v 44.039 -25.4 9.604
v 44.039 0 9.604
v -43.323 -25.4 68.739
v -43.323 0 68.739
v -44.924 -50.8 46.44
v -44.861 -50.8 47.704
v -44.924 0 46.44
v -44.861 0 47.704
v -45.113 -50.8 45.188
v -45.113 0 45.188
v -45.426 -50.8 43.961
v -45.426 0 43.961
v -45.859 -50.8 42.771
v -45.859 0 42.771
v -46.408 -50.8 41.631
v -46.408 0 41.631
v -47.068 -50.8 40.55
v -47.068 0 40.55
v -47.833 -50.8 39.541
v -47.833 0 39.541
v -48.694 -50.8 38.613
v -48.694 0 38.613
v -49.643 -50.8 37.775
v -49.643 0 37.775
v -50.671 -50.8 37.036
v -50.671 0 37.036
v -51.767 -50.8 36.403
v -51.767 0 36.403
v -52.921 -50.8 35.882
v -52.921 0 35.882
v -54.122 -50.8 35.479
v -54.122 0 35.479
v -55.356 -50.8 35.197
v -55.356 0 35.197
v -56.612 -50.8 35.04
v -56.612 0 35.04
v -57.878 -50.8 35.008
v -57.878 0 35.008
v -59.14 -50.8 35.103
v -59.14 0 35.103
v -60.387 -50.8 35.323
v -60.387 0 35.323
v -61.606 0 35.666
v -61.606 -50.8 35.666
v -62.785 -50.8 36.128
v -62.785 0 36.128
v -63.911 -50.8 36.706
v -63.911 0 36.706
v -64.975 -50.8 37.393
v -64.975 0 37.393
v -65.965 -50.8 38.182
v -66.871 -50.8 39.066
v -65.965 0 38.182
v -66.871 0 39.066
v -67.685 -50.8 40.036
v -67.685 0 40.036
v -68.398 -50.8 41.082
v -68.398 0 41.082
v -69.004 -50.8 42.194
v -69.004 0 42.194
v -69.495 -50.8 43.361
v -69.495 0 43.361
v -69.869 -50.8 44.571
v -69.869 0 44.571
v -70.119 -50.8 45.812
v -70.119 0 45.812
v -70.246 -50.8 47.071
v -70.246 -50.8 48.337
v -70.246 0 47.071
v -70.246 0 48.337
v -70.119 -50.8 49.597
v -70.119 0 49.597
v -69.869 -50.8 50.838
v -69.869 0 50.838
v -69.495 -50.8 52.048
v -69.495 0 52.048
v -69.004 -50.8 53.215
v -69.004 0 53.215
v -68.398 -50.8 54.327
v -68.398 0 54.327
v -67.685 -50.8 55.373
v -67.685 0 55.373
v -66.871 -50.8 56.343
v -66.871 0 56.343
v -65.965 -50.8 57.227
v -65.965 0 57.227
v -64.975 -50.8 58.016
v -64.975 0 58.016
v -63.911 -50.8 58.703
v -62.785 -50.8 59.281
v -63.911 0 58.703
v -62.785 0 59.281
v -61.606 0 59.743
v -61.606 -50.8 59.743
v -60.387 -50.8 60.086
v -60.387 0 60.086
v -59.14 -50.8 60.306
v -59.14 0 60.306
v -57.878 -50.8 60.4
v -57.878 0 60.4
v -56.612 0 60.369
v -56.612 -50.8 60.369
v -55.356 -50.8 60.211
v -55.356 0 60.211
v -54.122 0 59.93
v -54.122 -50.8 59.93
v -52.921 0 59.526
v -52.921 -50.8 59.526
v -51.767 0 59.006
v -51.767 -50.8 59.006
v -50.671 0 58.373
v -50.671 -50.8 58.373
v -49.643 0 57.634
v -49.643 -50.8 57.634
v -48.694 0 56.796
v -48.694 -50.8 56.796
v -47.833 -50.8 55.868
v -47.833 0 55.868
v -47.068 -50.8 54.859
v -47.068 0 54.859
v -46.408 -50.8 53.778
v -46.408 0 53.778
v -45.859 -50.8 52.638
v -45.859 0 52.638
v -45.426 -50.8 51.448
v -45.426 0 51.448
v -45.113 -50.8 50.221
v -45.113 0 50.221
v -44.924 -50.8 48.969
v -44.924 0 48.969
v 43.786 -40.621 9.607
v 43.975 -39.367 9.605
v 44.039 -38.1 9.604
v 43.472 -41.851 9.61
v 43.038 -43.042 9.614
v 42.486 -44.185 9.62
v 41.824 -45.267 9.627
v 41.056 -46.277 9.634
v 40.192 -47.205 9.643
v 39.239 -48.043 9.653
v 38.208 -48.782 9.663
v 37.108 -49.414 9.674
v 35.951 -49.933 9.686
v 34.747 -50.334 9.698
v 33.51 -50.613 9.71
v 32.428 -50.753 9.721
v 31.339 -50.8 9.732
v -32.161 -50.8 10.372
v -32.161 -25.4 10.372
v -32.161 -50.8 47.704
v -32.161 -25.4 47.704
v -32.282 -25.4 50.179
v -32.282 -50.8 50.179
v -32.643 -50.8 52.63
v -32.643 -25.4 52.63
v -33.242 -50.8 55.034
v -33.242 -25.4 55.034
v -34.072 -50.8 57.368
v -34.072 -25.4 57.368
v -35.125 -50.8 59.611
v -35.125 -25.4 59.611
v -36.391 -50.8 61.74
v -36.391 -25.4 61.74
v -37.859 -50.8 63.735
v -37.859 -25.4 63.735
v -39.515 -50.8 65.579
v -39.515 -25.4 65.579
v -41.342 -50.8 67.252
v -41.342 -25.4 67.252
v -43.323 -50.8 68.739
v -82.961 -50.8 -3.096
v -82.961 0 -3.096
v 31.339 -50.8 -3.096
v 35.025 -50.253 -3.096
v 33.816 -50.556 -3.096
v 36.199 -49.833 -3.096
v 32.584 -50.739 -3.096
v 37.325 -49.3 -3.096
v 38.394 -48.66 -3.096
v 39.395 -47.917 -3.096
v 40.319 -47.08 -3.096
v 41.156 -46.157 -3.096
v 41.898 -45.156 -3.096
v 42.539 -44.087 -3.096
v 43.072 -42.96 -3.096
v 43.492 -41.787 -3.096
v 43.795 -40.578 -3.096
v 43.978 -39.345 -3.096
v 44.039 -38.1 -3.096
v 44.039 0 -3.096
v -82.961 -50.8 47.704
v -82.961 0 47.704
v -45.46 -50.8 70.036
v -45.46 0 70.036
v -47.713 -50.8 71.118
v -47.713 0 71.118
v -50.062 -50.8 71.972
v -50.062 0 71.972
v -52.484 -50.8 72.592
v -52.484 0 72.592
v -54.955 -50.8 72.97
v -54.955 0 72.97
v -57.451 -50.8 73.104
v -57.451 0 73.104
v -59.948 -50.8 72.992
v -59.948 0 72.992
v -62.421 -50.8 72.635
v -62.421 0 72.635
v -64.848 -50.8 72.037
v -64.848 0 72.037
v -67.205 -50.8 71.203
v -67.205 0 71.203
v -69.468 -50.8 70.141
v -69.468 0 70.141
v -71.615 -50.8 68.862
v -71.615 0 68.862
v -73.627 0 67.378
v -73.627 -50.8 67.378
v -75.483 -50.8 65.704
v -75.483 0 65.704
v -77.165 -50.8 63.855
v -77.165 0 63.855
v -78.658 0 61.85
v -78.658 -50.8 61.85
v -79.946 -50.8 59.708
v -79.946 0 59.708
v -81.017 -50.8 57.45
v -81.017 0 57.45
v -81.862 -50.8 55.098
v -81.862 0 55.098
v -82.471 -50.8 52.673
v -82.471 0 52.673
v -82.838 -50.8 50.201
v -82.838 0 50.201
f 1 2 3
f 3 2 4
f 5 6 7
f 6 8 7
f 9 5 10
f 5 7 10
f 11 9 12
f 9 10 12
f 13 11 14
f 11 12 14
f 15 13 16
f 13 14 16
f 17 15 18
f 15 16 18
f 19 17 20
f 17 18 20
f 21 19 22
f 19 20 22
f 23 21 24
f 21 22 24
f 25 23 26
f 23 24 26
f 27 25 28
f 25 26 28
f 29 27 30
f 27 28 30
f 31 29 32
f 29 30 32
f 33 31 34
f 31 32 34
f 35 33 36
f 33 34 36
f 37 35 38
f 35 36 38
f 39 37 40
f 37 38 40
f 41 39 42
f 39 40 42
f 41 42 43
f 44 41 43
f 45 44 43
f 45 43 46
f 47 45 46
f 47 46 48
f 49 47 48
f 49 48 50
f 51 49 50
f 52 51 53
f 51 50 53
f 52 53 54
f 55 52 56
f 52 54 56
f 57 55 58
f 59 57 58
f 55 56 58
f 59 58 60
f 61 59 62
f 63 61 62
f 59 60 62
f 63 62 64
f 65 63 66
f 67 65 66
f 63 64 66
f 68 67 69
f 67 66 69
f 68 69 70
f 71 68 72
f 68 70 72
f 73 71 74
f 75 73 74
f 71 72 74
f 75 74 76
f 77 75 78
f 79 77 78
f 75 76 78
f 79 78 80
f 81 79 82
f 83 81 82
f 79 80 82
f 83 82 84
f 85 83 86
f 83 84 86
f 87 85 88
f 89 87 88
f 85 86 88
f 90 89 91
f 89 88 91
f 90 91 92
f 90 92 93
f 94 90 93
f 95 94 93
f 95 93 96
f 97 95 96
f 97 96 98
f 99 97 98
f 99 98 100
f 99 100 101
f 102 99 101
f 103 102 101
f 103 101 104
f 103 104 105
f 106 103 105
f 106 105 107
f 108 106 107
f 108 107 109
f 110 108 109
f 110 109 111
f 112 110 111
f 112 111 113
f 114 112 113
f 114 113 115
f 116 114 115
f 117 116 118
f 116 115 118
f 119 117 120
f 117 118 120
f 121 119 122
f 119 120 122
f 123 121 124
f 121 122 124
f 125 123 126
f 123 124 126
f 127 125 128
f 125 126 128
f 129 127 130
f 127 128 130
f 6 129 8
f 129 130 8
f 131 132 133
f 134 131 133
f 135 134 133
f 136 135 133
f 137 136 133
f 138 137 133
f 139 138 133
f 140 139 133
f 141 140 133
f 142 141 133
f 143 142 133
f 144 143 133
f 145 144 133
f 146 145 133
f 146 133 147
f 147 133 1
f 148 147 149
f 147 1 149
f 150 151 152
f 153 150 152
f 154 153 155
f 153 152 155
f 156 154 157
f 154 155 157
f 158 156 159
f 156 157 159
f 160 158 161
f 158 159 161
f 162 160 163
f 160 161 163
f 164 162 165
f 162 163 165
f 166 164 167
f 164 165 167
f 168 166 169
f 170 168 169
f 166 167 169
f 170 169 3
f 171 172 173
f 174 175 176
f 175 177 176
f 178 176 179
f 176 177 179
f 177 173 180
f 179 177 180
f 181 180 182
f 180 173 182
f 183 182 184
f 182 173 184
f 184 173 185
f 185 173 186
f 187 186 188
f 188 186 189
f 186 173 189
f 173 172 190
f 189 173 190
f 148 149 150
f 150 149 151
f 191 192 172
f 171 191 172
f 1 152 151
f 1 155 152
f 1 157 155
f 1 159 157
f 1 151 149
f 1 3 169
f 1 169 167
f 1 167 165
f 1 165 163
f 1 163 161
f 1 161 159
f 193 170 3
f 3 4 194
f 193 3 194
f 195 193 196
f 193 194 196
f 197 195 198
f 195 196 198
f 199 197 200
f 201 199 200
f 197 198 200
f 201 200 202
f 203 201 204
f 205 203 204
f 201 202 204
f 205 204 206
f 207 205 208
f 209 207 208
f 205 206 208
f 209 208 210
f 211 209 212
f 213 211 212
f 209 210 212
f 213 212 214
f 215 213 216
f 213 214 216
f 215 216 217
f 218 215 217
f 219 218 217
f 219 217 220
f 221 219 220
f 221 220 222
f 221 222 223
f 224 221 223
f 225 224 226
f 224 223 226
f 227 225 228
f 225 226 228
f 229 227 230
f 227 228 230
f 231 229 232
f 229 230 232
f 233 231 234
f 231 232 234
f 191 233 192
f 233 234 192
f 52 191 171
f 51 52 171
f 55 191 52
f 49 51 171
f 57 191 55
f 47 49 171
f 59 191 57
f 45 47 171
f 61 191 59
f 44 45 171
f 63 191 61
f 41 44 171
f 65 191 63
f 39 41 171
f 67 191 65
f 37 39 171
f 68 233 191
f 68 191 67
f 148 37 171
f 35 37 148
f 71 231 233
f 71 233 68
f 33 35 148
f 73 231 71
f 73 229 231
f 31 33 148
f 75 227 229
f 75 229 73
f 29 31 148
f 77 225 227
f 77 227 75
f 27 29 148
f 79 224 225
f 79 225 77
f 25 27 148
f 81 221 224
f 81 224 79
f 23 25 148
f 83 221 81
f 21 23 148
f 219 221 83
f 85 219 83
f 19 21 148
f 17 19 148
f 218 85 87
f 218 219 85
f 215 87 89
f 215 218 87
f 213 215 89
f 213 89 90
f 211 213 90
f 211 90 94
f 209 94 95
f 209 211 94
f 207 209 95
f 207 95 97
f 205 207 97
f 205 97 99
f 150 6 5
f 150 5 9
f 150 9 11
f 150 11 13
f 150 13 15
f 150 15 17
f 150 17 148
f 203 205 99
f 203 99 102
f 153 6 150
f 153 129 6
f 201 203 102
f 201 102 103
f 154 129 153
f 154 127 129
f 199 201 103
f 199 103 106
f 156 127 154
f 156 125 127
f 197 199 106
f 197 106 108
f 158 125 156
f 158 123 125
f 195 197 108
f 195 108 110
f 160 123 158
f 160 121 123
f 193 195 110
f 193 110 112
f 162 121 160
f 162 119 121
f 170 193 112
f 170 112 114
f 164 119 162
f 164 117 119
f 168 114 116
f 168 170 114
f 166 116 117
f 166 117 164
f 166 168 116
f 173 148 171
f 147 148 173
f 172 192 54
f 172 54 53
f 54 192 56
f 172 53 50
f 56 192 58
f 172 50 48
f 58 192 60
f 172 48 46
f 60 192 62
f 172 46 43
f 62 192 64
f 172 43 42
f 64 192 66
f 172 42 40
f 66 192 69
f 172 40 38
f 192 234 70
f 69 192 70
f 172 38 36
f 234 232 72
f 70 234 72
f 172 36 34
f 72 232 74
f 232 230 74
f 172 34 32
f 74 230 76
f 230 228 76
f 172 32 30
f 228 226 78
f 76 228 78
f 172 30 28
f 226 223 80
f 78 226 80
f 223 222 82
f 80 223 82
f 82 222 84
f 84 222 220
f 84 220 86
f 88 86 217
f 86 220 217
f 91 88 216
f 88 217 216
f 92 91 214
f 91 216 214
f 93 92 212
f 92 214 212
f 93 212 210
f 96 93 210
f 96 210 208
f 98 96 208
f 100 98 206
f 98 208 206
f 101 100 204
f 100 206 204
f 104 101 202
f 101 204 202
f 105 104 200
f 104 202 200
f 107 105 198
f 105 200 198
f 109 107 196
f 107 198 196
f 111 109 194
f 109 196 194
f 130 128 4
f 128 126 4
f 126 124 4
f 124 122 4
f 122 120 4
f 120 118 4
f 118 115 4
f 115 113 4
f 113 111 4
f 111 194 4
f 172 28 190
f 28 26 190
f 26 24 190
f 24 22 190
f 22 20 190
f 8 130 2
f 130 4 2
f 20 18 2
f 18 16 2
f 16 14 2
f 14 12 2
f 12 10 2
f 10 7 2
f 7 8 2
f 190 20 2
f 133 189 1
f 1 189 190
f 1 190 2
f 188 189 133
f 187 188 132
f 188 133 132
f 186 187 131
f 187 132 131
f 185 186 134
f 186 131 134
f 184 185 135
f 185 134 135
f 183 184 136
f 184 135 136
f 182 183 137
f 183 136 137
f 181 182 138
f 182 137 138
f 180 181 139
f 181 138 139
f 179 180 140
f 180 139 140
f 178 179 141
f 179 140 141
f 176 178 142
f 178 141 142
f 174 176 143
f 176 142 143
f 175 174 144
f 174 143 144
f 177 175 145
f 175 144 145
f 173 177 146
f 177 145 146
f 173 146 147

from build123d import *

# Parameters (mm, degrees)
F0_R     = 12.7
F1_DEPTH = 25.4
F3_DEPTH = 25.4
F4_R     = 12.7


with BuildPart() as f1:
    # F0 (on Front) → F1 (new body)
    with BuildSketch(Plane.XZ):
        with BuildLine():
            Line((44.0387030303, 9.6043962192), (-43.3234238415, 68.7387245609))
            ThreePointArc((-43.3234238415, 68.7387245609), (-69.4675563013, 70.1409955321), (-82.9612969697, 47.7043962192))
            Line((-82.9612969697, 47.7043962192), (-82.9612969697, -3.0956037808))
            Line((-82.9612969697, -3.0956037808), (44.0387030303, -3.0956037808))
            Line((44.0387030303, -3.0956037808), (44.0387030303, 9.6043962192))
        make_face()
        with Locations((-57.5612969697, 47.7043962192)):
            Circle(F0_R, mode=Mode.SUBTRACT)
    extrude(amount=F1_DEPTH)

    # F2 (on face) → F3 (join)
    with BuildSketch(Plane.XZ.offset(25.4)):
        with BuildLine():
            Line((44.0387030303, -3.0956037808), (44.0387030303, 9.6043962192))
            Line((44.0387030303, 9.6043962192), (-32.1612969697, 10.3719634618))
            Line((-32.1612969697, 10.3719634618), (-32.1612969697, 47.7043962192))
            ThreePointArc((-32.1612969697, 47.7043962192), (-35.1246976568, 59.6106555508), (-43.3234238415, 68.7387245609))
            ThreePointArc((-43.3234238415, 68.7387245609), (-69.4675563013, 70.1409955321), (-82.9612969697, 47.7043962192))
            Line((-82.9612969697, 47.7043962192), (-82.9612969697, -3.0956037808))
            Line((-82.9612969697, -3.0956037808), (44.0387030303, -3.0956037808))
        make_face()
        with BuildLine():
            ThreePointArc((-70.2612969697, 47.7043962192), (-57.5612969697, 60.4043962192), (-44.8612969697, 47.7043962192))
            ThreePointArc((-44.8612969697, 47.7043962192), (-57.5612969697, 35.0043962192), (-70.2612969697, 47.7043962192))
        make_face(mode=Mode.SUBTRACT)
    extrude(amount=F3_DEPTH)

    # F4
    f4_edges = [f1.edges().sort_by_distance(p)[0] for p in [
        (44.038703, -50.8, 3.254396),
    ]]
    fillet(f4_edges, radius=F4_R)


solid = f1.part
